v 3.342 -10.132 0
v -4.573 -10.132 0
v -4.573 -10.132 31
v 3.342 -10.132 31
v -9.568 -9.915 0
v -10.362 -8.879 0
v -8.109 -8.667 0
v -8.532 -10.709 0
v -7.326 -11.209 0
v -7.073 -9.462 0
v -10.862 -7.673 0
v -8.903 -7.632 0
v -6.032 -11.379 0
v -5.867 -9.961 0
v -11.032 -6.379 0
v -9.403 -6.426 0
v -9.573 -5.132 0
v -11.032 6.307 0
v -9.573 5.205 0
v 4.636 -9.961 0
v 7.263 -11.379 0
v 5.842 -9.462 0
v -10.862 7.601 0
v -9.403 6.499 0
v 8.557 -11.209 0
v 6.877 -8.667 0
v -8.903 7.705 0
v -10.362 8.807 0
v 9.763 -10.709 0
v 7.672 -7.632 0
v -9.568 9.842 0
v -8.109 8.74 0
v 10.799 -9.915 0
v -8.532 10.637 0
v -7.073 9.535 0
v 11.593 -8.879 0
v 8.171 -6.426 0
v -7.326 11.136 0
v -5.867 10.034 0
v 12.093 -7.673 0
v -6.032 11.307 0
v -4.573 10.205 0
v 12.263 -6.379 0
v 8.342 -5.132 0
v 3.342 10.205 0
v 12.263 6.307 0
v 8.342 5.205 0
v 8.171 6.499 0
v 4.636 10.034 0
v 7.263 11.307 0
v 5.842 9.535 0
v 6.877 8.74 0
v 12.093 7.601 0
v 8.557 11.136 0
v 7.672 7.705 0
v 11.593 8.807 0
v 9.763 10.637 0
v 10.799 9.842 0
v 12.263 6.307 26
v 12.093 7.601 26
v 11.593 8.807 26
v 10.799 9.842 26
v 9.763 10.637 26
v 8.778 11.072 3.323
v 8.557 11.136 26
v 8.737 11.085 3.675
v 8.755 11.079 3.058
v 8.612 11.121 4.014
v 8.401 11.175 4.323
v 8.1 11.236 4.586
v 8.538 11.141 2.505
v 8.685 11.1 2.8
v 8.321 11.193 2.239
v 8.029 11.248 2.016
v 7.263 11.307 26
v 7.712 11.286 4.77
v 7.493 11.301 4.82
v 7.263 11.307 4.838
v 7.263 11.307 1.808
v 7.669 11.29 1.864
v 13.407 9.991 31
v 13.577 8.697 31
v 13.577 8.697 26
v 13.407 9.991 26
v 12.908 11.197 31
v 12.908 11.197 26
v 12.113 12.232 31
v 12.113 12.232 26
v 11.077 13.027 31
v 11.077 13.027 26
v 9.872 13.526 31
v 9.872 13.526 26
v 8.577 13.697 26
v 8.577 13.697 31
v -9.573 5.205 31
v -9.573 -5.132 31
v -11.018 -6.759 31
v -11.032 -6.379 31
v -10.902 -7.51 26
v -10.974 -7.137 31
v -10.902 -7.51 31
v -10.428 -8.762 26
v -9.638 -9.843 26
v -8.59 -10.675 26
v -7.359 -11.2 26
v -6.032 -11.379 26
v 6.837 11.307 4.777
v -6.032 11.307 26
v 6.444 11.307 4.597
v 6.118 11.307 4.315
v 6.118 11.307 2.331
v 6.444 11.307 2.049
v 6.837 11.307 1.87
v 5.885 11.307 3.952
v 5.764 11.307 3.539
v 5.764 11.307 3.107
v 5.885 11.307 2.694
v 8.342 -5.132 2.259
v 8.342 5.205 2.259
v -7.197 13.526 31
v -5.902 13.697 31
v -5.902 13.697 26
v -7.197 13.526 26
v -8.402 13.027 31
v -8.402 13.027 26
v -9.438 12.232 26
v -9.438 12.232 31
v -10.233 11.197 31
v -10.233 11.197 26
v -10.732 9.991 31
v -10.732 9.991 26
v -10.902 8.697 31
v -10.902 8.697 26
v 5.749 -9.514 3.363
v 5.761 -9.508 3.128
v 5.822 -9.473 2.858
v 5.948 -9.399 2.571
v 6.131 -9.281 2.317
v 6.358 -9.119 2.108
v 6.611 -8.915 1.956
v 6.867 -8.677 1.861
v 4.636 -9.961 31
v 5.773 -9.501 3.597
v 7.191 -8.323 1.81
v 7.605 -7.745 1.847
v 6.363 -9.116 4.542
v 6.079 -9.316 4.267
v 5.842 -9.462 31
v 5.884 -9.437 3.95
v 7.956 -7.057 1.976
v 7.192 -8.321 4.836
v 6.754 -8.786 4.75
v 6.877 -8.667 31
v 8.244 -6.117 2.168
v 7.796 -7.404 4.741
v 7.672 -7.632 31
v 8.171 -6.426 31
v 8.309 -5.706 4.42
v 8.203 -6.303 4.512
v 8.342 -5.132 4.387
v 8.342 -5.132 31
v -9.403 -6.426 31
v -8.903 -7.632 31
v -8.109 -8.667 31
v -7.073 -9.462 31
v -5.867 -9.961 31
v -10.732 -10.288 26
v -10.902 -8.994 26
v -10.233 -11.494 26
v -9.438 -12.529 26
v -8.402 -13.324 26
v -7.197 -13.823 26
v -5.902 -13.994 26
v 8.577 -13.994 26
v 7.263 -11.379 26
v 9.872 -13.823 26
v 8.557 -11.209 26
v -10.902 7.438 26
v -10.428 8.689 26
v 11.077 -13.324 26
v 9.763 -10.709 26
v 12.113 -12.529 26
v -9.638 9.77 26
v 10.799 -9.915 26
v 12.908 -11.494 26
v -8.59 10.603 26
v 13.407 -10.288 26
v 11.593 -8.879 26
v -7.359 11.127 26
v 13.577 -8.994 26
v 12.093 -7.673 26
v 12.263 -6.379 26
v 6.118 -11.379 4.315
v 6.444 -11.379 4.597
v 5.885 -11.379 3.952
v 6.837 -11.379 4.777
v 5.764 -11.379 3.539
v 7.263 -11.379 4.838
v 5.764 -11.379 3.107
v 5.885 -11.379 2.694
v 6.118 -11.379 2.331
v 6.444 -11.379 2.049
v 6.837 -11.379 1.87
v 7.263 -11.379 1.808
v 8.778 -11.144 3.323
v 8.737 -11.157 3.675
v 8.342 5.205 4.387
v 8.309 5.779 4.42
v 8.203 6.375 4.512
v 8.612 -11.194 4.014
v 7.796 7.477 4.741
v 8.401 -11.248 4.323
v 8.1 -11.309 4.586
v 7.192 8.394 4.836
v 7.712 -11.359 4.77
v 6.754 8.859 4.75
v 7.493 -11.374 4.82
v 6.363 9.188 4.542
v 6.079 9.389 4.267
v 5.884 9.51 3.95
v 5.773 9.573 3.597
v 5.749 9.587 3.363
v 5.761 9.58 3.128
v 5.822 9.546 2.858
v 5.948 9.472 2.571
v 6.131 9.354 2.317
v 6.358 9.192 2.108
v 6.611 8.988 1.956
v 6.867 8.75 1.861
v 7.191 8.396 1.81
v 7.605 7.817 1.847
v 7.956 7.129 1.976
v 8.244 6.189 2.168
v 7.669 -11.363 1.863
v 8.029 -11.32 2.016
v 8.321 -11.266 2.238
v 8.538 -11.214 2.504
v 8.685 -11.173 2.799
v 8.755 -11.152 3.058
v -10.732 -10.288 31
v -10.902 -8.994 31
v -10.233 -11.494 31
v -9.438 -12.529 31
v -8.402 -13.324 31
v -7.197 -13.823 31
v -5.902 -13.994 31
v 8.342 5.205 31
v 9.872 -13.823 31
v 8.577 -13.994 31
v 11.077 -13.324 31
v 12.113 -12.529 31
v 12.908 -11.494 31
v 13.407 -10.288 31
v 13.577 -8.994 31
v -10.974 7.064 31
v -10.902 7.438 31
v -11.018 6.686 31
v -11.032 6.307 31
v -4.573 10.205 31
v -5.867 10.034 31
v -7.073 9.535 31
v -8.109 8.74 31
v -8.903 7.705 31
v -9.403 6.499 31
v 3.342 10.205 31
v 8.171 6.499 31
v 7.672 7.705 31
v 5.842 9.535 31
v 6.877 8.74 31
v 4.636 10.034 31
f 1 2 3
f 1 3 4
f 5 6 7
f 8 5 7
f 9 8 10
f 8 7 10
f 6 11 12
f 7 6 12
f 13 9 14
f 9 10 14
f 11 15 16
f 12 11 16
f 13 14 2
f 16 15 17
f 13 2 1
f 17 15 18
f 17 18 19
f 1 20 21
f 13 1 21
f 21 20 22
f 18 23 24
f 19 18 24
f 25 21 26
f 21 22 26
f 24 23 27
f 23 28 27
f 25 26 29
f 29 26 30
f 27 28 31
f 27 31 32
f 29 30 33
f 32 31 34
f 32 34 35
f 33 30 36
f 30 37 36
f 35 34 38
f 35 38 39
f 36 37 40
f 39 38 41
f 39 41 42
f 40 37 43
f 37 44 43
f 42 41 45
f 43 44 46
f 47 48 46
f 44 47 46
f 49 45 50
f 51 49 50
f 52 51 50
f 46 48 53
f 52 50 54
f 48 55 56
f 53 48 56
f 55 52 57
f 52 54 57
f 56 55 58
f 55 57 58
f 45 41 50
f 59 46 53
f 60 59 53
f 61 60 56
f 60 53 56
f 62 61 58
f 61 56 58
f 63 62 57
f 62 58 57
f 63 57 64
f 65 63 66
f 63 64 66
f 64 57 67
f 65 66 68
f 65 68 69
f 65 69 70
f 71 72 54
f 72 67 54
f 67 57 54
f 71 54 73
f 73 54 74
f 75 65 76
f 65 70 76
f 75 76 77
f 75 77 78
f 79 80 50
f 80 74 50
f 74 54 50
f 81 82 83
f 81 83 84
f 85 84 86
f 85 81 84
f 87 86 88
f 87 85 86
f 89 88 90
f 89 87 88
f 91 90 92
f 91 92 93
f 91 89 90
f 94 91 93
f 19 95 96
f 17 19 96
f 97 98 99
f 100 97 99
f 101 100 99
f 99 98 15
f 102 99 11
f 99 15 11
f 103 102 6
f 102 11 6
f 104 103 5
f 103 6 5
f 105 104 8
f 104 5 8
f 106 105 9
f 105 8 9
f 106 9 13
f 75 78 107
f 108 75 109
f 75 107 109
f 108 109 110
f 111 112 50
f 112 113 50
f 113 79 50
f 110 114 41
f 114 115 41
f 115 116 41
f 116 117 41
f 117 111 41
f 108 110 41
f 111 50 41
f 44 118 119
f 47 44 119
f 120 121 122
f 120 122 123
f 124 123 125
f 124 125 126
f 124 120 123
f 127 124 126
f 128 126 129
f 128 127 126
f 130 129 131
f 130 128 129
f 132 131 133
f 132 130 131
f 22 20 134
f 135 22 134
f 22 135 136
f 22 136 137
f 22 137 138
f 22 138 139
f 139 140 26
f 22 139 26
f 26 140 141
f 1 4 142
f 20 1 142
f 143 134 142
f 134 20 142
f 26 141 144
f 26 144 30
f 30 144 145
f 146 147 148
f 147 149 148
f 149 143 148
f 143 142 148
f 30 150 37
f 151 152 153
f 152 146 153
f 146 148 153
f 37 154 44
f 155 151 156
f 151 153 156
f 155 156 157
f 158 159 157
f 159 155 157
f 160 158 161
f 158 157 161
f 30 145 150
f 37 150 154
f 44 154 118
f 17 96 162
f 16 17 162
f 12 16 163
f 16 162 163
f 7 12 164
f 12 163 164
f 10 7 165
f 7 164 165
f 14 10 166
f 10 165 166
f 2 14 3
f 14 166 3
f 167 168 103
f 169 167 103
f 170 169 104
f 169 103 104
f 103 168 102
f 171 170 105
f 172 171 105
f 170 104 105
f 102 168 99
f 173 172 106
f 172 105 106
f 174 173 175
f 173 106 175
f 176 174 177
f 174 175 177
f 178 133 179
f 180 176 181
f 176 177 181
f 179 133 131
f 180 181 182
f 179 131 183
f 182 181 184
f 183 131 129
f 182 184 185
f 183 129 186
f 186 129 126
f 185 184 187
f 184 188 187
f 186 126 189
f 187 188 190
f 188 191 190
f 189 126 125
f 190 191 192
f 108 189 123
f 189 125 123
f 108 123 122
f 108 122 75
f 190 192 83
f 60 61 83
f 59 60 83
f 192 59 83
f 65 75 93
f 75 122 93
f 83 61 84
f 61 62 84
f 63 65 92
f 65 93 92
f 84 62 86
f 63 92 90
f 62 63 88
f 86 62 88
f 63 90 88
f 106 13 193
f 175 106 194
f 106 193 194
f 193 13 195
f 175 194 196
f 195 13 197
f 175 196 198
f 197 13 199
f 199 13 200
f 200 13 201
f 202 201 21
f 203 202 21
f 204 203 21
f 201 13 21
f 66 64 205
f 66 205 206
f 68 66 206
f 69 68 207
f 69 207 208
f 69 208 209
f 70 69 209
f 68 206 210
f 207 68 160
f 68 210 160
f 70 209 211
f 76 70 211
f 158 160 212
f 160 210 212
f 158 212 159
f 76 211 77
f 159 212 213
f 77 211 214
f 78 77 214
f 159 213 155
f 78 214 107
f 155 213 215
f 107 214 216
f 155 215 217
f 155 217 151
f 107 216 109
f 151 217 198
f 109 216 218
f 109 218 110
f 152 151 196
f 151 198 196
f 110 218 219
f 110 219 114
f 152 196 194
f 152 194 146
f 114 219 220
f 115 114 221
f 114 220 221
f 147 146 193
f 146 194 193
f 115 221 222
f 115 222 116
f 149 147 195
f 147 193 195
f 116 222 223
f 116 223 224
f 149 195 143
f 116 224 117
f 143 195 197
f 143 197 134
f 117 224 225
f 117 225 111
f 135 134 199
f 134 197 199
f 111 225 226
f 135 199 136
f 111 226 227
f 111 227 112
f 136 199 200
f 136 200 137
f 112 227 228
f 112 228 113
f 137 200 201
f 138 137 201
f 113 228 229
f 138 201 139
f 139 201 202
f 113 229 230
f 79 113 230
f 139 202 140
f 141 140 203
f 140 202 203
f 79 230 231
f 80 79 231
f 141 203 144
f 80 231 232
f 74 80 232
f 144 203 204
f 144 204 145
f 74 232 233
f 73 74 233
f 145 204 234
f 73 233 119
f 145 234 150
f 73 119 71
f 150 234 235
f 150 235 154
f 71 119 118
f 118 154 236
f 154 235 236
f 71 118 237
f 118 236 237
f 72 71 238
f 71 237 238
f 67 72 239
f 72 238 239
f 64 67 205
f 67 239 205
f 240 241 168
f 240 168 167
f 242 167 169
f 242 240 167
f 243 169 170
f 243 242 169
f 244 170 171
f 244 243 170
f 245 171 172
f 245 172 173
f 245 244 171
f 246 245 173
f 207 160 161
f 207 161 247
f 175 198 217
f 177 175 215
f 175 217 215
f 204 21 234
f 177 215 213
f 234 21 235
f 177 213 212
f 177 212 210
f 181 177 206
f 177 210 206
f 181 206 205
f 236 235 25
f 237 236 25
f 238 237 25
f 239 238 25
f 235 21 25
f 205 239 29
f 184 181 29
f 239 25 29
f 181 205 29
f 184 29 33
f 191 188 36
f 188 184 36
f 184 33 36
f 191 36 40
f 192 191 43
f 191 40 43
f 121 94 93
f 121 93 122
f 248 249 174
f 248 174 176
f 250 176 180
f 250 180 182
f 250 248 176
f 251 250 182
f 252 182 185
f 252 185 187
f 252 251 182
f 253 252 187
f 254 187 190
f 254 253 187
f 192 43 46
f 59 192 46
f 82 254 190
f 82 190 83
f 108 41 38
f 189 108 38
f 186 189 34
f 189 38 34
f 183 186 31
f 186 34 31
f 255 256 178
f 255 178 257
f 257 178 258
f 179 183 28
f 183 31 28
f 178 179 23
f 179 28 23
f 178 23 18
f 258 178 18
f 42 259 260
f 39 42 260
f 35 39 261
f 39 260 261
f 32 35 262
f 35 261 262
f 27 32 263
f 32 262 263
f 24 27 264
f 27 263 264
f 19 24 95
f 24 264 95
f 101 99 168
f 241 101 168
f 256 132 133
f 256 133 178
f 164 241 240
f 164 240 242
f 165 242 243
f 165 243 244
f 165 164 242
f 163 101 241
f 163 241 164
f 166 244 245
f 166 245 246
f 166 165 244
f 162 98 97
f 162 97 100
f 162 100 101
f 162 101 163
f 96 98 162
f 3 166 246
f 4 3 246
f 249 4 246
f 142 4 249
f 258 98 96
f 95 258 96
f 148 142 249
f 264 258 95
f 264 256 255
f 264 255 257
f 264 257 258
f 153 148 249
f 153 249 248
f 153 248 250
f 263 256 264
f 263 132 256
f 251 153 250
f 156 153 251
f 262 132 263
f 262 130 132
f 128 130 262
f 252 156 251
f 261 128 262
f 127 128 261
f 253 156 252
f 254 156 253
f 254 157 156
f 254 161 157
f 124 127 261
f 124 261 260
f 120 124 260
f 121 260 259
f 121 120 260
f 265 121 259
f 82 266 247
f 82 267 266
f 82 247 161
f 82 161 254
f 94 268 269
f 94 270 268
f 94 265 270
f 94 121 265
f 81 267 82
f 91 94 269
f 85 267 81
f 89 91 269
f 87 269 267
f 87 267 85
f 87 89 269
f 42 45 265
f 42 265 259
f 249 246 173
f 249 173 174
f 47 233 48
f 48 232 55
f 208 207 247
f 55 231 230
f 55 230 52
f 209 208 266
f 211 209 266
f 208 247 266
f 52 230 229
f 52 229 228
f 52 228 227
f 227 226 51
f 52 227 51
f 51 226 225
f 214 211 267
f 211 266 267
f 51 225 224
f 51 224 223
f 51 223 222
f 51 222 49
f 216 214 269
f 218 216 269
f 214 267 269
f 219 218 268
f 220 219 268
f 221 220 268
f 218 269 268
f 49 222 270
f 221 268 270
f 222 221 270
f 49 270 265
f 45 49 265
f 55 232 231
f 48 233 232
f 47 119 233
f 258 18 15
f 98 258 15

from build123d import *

# Parameters (mm, degrees)
F1_DEPTH = 31
F3_DEPTH = 5
F4_DEPTH = 25
F5_R     = 1.5148959557
F6_DEPTH = 25


with BuildPart() as f1:
    # F0 (on Top) → F1 (new body)
    with BuildSketch(Plane.XY):
        with BuildLine():
            Line((7.263335404, 11.3065338519), (-6.0320308013, 11.3065338519))
            ThreePointArc((-6.0320308013, 11.3065338519), (-9.5675647072, 9.8420677578), (-11.0320308013, 6.3065338519))
            Line((-11.0320308013, 6.3065338519), (-11.0320308013, -6.3793600758))
            ThreePointArc((-11.0320308013, -6.3793600758), (-9.5675647072, -9.9148939817), (-6.0320308013, -11.3793600758))
            Line((-6.0320308013, -11.3793600758), (7.263335404, -11.3793600758))
            ThreePointArc((7.263335404, -11.3793600758), (10.7988693099, -9.9148939817), (12.263335404, -6.3793600758))
            Line((12.263335404, -6.3793600758), (12.263335404, 6.3065338519))
            ThreePointArc((12.263335404, 6.3065338519), (10.7988693099, 9.8420677578), (7.263335404, 11.3065338519))
        make_face()
        with BuildLine():
            Line((-4.572982206, 10.2046227839), (3.3416776033, 10.2046227839))
            ThreePointArc((3.3416776033, 10.2046227839), (6.8772115092, 8.7401566899), (8.3416776033, 5.2046227839))
            Line((8.3416776033, 5.2046227839), (8.3416776033, -5.13179656))
            ThreePointArc((8.3416776033, -5.13179656), (6.8772115092, -8.667330466), (3.3416776033, -10.13179656))
            Line((3.3416776033, -10.13179656), (-4.572982206, -10.13179656))
            ThreePointArc((-4.572982206, -10.13179656), (-8.1085161119, -8.667330466), (-9.572982206, -5.13179656))
            Line((-9.572982206, -5.13179656), (-9.572982206, 5.2046227839))
            ThreePointArc((-9.572982206, 5.2046227839), (-8.1085161119, 8.7401566899), (-4.572982206, 10.2046227839))
        make_face(mode=Mode.SUBTRACT)
    extrude(amount=F1_DEPTH)

    # F2 (on face) → F3 (join)
    with BuildSketch(Plane.XY.offset(31)):
        with BuildLine():
            ThreePointArc((13.5774351656, 8.6966696009), (12.1129690716, 12.2322035068), (8.5774351656, 13.6966696009))
            Line((8.5774351656, 13.6966696009), (-5.9024299309, 13.6966696009))
            ThreePointArc((-5.9024299309, 13.6966696009), (-9.4379638368, 12.2322035068), (-10.9024299309, 8.6966696009))
            Line((-10.9024299309, 8.6966696009), (-10.9024299309, -8.9936683699))
            ThreePointArc((-10.9024299309, -8.9936683699), (-9.4379638368, -12.5292022759), (-5.9024299309, -13.9936683699))
            Line((-5.9024299309, -13.9936683699), (8.5774351656, -13.9936683699))
            ThreePointArc((8.5774351656, -13.9936683699), (12.1129690716, -12.5292022759), (13.5774351656, -8.9936683699))
            Line((13.5774351656, -8.9936683699), (13.5774351656, 8.6966696009))
        make_face()
    extrude(amount=-F3_DEPTH)

    # F2 (on face) → F4 (cut)
    with BuildSketch(Plane.XY.offset(31)):
        with BuildLine():
            Line((3.3416776033, 10.2046227839), (-4.572982206, 10.2046227839))
            ThreePointArc((-4.572982206, 10.2046227839), (-8.1085161119, 8.7401566899), (-9.572982206, 5.2046227839))
            Line((-9.572982206, 5.2046227839), (-9.572982206, -5.13179656))
            ThreePointArc((-9.572982206, -5.13179656), (-8.1085161119, -8.667330466), (-4.572982206, -10.13179656))
            Line((-4.572982206, -10.13179656), (3.3416776033, -10.13179656))
            ThreePointArc((3.3416776033, -10.13179656), (6.8772115092, -8.667330466), (8.3416776033, -5.13179656))
            Line((8.3416776033, -5.13179656), (8.3416776033, 5.2046227839))
            ThreePointArc((8.3416776033, 5.2046227839), (6.8772115092, 8.7401566899), (3.3416776033, 10.2046227839))
        make_face()
    extrude(amount=-F4_DEPTH, mode=Mode.SUBTRACT)

    # F5 (on face) → F6 (cut)
    with BuildSketch(Plane.XZ.offset(11.3793600758)):
        with Locations((7.263335404, 3.3230453264)):
            Circle(F5_R)
    extrude(amount=-F6_DEPTH, mode=Mode.SUBTRACT)


solid = f1.part
